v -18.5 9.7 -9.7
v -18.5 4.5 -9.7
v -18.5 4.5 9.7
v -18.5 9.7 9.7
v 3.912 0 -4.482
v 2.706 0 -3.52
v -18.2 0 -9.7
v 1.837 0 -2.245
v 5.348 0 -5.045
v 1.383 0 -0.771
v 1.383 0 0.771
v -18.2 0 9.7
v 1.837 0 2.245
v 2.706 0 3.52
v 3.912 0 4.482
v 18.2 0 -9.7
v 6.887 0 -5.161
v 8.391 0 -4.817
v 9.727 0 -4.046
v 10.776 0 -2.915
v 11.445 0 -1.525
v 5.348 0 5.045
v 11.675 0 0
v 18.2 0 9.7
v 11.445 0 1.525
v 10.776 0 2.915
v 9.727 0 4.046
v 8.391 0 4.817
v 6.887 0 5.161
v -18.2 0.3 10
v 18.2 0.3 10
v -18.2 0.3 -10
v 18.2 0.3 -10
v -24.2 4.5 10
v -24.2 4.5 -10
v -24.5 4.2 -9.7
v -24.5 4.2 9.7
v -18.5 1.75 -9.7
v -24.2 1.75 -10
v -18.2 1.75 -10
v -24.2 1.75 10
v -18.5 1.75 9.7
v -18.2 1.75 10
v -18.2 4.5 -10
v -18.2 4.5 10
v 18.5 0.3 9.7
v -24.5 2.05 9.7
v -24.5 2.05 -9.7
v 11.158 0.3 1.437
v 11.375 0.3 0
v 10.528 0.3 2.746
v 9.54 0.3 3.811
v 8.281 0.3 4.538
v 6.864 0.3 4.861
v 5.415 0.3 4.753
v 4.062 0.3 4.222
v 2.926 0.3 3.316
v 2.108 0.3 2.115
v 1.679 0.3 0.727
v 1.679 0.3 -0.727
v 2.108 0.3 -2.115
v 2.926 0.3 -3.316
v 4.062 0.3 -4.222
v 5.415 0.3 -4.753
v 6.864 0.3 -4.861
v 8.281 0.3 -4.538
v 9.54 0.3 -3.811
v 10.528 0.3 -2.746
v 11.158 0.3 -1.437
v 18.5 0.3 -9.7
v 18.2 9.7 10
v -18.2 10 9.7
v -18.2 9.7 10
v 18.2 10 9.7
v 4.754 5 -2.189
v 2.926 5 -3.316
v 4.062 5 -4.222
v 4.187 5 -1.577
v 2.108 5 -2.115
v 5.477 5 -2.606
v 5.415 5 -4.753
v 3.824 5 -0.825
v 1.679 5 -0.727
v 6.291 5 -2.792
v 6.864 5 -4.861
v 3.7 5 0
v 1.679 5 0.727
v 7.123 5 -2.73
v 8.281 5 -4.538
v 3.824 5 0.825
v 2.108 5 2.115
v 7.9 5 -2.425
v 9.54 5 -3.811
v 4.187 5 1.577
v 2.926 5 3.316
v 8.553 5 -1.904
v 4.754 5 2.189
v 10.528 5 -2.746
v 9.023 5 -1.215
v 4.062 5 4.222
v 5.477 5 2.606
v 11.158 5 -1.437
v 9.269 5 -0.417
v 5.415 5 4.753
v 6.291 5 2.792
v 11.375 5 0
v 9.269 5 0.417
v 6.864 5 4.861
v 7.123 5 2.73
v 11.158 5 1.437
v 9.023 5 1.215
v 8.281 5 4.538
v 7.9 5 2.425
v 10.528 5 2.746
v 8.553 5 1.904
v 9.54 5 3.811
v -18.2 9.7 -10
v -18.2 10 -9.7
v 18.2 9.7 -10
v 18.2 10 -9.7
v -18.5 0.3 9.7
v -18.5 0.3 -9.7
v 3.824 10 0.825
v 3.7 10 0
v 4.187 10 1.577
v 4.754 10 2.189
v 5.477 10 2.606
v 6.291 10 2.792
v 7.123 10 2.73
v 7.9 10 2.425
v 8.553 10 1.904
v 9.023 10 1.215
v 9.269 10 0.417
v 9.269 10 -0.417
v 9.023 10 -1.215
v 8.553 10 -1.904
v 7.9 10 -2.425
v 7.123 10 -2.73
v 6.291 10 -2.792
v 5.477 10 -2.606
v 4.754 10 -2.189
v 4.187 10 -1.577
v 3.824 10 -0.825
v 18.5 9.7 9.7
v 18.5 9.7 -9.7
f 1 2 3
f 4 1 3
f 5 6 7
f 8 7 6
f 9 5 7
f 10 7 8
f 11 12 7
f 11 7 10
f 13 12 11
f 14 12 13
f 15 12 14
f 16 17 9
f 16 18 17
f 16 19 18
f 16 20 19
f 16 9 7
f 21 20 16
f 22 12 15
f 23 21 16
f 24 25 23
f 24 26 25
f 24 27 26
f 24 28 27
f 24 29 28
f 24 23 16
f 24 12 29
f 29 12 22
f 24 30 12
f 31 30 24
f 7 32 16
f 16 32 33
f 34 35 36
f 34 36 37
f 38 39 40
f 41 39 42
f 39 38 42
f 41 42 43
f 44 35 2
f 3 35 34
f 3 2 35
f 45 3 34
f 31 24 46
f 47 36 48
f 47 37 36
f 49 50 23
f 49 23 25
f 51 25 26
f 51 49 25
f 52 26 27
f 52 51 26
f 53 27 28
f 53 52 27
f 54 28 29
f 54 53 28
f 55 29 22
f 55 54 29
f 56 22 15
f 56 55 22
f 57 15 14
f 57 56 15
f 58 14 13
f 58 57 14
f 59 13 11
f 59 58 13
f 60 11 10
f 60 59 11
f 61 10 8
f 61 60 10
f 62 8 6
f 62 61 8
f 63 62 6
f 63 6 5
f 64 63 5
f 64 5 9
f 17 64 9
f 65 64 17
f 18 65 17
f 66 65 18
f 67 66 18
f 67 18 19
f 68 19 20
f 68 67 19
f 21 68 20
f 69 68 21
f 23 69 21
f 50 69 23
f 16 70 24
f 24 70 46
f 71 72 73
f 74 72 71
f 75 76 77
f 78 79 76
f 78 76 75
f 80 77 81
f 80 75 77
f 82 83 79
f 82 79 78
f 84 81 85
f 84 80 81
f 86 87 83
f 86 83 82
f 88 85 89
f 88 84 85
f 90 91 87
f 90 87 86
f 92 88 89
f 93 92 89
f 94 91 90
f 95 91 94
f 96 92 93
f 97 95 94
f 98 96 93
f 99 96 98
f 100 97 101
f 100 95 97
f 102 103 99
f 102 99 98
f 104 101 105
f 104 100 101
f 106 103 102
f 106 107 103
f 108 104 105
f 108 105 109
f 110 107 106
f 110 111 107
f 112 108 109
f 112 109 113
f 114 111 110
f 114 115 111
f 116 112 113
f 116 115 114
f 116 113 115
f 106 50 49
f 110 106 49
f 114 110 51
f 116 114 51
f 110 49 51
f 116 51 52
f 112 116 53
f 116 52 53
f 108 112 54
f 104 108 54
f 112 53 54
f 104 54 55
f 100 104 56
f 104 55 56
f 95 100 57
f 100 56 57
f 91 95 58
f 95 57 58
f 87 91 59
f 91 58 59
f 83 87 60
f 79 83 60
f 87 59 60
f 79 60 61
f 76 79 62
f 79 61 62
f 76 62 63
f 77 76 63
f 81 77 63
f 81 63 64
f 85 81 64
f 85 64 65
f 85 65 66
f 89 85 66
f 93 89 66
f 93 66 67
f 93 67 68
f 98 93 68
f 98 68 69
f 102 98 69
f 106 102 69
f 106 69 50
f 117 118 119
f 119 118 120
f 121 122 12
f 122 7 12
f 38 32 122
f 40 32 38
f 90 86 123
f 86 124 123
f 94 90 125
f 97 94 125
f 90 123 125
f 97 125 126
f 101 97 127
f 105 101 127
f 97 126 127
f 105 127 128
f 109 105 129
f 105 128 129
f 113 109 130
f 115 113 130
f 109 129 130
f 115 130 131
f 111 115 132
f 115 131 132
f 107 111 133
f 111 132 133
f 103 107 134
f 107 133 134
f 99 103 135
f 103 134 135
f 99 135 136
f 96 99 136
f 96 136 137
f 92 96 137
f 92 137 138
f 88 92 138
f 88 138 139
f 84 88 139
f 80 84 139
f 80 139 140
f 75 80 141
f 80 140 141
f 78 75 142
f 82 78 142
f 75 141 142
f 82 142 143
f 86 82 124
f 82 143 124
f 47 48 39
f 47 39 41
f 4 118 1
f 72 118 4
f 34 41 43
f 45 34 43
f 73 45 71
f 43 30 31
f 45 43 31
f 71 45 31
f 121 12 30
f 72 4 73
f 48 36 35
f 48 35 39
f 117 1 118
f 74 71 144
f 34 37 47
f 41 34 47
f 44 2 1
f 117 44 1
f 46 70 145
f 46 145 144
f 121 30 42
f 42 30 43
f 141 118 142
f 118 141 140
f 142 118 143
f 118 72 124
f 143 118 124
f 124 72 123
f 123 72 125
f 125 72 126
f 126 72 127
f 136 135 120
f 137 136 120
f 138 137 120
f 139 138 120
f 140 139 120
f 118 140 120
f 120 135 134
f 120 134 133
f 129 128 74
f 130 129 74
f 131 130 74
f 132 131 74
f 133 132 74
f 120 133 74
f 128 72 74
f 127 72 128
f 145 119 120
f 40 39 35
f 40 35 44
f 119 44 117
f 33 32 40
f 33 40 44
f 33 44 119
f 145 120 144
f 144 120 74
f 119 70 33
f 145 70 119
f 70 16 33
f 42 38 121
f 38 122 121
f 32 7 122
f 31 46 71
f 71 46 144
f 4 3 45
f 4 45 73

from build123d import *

# Parameters (mm, degrees)
F0_W           = 37
F0_H           = 20
F1_DEPTH       = 10
F2_D           = 5.6
F2_CBORE_D     = 9.75
F2_CBORE_DEPTH = 5
F3_W           = 2.75
F3_H           = 20
F4_DEPTH       = 6
F5_SIZE        = 0.3


with BuildPart() as f1:
    # F0 (on Front) → F1 (new body)
    with BuildSketch(Plane.XZ):
        Rectangle(F0_W, F0_H)
    extrude(amount=-F1_DEPTH)

    # F2 (through all)
    with Locations(Plane.XZ):
        with Locations((6.5, 0)):
            CounterBoreHole(F2_D / 2, F2_CBORE_D / 2, F2_CBORE_DEPTH)

    # F3 (on face) → F4 (join)
    with BuildSketch(Plane(origin=(-18.5, 0, 0), x_dir=(0, -1, 0), z_dir=(-1, 0, 0))):
        with Locations((-3.125, 0)):
            Rectangle(F3_W, F3_H)
    extrude(amount=F4_DEPTH)

    # F5
    f5_edges = [f1.edges().sort_by_distance(p)[0] for p in [
        (0, 0, 10),
        (-18.5, 0, 0),
        (0, 0, -10),
        (18.5, 0, 0),
        (18.5, 5, -10),
        (18.5, 5, 10),
        (-18.5, 0.875, -10),
        (-18.5, 7.25, -10),
        (-24.5, 3.125, -10),
        (-24.5, 3.125, 10),
        (-18.5, 0.875, 10),
        (-18.5, 7.25, 10),
        (-24.5, 1.75, 0),
        (-24.5, 4.5, 0),
        (-18.5, 10, 0),
        (0, 10, 10),
        (0, 10, -10),
        (18.5, 10, 0),
        (1.625, 0, 0),
    ]]
    chamfer(f5_edges, length=F5_SIZE)


solid = f1.part
